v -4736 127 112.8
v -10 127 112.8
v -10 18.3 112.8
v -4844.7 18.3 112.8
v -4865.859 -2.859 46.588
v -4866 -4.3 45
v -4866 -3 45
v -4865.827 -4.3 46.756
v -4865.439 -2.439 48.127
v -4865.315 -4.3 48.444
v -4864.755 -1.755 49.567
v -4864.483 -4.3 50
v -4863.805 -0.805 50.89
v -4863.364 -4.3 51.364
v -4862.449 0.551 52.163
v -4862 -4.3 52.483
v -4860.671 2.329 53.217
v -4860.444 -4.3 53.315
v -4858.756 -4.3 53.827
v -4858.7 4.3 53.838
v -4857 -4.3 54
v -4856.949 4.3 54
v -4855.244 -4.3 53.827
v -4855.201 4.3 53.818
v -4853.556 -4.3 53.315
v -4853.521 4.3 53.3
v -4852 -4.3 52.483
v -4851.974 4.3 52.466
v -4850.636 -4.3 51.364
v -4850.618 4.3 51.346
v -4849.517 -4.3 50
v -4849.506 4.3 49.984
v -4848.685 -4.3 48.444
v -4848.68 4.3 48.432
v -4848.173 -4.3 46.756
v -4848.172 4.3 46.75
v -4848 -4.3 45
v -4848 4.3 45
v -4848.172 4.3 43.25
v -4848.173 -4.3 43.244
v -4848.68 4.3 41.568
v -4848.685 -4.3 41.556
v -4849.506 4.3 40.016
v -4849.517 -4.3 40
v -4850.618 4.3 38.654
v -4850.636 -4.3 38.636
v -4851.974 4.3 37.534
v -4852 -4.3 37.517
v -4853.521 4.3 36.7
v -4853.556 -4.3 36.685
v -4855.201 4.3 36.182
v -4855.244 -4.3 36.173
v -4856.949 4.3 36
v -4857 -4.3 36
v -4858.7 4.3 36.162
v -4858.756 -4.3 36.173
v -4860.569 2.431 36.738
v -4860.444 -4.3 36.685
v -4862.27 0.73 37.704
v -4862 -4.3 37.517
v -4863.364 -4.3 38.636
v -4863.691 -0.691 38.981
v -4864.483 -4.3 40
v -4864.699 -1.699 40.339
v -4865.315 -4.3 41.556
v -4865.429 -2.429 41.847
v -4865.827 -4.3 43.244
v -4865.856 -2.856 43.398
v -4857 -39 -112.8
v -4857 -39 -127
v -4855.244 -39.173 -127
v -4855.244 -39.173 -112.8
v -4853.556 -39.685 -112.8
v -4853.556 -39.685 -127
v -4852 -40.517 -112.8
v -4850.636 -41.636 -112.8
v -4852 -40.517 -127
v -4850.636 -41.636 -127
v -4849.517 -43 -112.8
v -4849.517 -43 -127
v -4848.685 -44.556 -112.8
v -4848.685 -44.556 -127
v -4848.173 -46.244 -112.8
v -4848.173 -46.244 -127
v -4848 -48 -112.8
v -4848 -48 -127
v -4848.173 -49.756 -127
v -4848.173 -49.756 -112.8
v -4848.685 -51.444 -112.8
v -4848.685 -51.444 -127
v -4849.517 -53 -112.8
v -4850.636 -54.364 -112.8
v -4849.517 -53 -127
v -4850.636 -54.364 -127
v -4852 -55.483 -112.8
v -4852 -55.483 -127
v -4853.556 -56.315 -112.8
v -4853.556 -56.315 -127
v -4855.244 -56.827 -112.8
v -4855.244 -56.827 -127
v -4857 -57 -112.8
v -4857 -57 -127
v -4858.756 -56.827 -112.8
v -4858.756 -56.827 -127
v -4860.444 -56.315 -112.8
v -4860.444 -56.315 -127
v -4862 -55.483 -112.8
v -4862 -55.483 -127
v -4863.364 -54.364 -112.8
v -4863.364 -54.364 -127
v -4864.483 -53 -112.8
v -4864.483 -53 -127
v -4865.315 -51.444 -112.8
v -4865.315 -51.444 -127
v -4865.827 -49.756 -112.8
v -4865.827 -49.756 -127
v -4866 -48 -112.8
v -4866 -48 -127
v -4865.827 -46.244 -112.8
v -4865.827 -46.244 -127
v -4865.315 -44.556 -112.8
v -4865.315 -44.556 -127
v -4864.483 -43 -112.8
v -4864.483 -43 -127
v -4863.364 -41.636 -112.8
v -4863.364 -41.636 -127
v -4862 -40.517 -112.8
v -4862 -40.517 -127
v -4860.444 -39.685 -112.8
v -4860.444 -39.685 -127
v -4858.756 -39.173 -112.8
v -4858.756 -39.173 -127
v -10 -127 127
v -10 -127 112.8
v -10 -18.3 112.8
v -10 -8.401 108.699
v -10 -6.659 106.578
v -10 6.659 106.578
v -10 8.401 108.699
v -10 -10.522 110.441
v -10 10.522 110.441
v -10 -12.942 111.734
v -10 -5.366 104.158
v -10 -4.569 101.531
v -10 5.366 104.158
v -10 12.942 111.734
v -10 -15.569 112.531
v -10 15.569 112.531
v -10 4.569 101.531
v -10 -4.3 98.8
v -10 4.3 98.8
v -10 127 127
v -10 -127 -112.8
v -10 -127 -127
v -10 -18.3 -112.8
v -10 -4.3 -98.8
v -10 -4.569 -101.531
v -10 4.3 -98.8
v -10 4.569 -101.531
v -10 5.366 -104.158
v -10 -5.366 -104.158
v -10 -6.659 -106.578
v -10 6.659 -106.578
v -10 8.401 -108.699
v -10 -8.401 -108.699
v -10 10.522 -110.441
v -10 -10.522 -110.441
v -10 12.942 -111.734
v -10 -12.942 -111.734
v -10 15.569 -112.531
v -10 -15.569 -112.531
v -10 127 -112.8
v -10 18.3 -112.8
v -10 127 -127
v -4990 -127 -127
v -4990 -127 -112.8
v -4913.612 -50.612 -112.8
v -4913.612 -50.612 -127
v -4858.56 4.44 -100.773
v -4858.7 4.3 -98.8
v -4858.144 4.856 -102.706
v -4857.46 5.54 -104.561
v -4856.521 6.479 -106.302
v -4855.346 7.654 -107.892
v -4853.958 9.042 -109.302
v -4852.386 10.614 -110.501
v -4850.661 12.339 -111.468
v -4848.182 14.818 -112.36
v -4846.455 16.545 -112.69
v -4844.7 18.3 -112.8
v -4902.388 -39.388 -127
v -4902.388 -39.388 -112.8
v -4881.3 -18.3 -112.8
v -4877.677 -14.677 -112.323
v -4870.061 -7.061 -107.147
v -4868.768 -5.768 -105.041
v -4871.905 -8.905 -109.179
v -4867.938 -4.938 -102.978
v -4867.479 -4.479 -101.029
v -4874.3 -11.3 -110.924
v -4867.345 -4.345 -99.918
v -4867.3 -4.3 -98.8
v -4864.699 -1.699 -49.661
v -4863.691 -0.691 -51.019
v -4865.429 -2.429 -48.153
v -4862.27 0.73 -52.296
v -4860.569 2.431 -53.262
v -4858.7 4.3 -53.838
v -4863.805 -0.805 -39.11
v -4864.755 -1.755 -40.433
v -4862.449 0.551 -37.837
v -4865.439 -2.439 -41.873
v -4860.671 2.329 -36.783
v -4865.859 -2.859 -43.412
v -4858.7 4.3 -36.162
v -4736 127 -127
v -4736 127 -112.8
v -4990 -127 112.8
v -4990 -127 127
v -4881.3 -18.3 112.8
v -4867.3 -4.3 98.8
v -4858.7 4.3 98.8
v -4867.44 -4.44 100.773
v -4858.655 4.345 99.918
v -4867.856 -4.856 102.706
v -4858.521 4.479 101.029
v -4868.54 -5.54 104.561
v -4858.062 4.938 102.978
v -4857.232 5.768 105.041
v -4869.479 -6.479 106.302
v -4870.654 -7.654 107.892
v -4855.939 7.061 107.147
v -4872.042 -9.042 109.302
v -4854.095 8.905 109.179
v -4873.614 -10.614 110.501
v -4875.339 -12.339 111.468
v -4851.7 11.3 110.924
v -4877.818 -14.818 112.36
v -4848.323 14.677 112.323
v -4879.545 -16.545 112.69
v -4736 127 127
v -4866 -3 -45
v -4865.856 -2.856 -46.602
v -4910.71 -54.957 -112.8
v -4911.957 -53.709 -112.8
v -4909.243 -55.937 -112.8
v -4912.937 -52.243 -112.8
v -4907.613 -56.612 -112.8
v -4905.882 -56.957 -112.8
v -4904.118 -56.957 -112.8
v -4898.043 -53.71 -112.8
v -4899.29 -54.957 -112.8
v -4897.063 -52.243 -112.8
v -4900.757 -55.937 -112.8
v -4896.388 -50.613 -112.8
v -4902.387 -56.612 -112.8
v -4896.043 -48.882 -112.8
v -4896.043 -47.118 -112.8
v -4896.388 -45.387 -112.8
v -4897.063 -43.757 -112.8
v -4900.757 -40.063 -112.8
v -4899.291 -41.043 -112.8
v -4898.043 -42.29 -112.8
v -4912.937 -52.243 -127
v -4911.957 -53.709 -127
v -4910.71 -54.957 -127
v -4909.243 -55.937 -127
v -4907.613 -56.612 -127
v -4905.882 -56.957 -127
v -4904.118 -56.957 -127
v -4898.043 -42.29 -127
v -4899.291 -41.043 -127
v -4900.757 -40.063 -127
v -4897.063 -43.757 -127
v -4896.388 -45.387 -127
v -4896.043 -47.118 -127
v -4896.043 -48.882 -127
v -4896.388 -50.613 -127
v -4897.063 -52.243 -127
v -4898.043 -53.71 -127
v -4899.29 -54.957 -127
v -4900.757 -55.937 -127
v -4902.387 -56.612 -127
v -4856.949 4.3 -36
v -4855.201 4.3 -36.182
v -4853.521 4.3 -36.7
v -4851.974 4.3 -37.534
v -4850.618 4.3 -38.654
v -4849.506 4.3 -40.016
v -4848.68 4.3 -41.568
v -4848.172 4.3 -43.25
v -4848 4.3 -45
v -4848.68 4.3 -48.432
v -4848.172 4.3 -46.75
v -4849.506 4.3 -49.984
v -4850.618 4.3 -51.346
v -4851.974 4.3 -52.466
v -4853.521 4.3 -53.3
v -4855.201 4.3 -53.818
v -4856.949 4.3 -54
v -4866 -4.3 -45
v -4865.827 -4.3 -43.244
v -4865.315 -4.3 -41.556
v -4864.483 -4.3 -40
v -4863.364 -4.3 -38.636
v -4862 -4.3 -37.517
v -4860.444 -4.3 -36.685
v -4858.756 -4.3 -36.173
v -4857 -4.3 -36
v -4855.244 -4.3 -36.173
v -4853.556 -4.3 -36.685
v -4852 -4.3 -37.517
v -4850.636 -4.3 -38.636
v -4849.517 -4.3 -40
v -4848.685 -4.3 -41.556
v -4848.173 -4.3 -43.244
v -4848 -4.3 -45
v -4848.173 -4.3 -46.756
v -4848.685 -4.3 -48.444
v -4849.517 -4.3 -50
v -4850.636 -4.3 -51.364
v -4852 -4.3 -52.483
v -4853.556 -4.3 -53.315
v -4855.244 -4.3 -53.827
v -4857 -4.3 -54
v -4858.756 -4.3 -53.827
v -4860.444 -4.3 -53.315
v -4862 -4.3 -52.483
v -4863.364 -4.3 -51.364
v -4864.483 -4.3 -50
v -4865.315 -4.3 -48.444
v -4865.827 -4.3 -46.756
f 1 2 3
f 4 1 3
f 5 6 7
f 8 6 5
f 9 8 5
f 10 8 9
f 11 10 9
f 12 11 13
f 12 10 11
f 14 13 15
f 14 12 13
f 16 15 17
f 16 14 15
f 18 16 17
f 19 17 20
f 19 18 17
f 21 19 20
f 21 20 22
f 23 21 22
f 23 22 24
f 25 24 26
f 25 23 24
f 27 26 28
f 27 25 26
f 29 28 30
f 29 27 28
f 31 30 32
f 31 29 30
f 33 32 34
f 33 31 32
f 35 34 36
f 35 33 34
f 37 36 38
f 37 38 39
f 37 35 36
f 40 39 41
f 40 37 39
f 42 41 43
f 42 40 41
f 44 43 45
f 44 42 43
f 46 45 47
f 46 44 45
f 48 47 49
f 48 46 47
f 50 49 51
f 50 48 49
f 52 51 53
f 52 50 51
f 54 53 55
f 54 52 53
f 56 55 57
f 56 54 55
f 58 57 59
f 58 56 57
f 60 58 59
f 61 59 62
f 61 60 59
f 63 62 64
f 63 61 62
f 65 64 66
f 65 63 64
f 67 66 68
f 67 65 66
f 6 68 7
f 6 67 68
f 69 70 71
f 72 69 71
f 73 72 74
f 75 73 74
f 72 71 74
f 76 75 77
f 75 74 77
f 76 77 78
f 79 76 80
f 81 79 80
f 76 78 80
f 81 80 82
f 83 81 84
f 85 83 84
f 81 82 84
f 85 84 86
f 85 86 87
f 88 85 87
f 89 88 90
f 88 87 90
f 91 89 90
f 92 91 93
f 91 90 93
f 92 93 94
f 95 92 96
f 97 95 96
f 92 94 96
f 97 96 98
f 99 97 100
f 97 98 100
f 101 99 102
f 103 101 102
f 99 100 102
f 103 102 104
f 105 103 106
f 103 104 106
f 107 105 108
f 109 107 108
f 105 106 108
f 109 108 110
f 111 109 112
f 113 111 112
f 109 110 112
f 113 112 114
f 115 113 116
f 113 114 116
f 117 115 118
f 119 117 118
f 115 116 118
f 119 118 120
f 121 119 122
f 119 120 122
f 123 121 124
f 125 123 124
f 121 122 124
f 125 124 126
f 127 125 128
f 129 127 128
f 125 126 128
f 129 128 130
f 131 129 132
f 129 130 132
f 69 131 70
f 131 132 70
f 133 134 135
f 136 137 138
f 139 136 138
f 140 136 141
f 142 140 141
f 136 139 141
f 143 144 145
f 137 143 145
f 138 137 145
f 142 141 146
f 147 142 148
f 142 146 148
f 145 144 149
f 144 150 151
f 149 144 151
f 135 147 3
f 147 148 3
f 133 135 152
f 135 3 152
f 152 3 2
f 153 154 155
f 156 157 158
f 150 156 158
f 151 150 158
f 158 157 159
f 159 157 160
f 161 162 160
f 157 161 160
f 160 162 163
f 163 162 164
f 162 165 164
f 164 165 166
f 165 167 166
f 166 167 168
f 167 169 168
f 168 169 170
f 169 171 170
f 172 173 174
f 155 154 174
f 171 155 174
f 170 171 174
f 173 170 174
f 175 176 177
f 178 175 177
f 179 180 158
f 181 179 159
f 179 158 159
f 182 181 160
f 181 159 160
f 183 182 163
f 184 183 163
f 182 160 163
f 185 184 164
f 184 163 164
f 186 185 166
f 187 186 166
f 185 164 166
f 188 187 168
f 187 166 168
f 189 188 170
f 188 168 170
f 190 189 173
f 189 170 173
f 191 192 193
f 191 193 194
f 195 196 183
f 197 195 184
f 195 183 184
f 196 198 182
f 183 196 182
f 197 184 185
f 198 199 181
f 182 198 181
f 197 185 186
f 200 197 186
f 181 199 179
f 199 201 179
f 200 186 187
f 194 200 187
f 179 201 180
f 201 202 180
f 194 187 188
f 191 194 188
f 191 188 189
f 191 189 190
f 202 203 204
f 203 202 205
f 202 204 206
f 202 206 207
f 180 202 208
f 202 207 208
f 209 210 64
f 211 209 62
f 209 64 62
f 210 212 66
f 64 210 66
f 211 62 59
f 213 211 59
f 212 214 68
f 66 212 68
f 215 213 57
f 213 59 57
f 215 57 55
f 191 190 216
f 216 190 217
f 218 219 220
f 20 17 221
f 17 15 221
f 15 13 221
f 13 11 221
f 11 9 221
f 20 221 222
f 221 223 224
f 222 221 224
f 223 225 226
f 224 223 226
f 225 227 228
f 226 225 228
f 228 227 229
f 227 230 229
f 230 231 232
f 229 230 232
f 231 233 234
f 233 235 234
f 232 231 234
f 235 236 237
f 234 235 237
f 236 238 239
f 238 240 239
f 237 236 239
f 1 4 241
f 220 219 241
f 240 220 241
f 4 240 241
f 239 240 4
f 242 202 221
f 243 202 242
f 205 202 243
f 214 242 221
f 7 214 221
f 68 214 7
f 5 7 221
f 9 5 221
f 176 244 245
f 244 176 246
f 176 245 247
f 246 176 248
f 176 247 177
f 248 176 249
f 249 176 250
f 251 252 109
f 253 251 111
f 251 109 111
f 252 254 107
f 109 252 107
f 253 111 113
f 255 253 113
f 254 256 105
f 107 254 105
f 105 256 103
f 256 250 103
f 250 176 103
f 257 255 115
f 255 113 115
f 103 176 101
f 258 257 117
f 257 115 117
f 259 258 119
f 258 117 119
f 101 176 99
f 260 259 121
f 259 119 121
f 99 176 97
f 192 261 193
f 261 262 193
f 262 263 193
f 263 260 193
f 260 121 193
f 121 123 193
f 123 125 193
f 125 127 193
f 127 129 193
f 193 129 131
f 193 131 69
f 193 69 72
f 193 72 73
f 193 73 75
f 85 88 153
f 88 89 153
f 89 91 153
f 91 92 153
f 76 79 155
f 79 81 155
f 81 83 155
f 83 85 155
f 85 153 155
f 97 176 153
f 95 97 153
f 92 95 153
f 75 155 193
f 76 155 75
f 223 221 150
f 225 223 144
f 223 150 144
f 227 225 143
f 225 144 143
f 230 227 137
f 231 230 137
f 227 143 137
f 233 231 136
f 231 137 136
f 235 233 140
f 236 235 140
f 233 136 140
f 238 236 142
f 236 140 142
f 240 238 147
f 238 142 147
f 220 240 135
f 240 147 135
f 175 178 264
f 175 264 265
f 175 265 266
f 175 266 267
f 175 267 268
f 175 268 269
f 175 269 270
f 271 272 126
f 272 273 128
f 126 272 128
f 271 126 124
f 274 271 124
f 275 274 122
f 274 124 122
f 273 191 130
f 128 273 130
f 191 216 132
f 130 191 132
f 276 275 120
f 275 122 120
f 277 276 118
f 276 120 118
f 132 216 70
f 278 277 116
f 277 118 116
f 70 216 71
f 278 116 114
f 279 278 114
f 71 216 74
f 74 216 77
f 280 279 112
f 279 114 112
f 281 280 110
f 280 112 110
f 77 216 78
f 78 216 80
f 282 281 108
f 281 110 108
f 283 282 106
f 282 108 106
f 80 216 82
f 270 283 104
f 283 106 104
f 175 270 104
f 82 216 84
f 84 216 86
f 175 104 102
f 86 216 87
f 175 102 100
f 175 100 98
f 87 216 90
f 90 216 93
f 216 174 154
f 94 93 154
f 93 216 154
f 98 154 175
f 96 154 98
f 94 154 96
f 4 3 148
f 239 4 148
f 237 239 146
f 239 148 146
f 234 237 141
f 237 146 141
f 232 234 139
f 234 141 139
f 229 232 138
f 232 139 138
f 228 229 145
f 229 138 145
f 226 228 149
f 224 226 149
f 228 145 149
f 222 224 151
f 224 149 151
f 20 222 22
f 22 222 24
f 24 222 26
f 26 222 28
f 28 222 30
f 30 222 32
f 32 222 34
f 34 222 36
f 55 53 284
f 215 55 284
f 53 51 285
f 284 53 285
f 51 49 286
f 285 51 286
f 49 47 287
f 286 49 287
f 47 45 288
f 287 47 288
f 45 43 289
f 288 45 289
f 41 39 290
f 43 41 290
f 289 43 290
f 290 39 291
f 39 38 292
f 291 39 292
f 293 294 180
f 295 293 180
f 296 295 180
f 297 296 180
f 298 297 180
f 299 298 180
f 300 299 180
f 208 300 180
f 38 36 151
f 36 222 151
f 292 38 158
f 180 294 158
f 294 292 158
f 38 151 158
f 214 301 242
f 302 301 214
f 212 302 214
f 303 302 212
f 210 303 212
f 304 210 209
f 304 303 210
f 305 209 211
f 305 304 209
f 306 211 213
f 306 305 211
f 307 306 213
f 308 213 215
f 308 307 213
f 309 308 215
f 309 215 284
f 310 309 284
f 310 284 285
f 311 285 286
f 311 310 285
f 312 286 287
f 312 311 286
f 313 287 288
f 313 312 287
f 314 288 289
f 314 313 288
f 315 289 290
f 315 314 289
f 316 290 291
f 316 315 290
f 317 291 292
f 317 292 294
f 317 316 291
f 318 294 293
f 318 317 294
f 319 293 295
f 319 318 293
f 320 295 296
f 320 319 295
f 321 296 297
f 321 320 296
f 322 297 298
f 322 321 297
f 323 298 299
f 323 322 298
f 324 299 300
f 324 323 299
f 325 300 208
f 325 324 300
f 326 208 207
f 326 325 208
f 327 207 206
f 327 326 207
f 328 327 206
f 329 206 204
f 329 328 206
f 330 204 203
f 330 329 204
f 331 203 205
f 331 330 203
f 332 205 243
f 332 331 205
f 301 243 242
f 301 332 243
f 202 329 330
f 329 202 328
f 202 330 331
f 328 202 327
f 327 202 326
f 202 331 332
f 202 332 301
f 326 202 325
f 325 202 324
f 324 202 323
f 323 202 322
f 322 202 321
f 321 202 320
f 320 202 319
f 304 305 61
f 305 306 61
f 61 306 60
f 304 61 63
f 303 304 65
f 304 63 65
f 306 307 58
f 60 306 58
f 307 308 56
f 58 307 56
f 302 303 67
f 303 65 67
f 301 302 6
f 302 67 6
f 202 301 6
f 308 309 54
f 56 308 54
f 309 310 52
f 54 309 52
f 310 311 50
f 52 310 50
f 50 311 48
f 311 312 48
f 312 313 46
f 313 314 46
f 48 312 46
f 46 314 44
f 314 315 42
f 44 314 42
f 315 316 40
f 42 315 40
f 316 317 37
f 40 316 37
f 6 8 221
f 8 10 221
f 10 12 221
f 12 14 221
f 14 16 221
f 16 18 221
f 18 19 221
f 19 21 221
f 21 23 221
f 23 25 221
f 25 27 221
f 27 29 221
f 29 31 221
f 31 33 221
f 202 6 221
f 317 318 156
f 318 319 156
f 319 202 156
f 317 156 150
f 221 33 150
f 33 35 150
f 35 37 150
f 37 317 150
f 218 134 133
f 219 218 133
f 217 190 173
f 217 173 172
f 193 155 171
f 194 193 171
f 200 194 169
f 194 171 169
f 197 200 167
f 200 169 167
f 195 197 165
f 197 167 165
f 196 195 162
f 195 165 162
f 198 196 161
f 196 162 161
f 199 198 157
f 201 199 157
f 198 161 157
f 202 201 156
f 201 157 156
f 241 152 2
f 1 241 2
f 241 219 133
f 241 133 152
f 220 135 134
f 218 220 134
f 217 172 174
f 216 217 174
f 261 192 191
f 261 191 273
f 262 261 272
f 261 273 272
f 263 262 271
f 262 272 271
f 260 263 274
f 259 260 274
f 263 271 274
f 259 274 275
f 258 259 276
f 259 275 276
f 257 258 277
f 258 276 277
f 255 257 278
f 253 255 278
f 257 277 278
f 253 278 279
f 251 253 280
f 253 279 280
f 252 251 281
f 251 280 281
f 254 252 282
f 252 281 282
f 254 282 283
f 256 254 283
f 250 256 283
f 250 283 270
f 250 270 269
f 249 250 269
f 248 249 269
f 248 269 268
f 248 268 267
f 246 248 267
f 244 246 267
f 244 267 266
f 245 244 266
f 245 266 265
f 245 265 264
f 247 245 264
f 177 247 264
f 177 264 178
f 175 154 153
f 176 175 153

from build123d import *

# Parameters (mm, degrees)
UNIVERSAL_COLUMN_ICS_250UC72_9_1_DEPTH = 5000
SKETCH3_R                              = 9
CUT_EXTRUDE2_DEPTH                     = 14.2
SKETCH20_R                             = 9
CUT_EXTRUDE19_DEPTH                    = 4.3
SKETCH21_W                             = 254
SKETCH21_H                             = 254
CUT_EXTRUDE20_DEPTH                    = 10
SKETCH22_W                             = 282
SKETCH22_H                             = 282
CUT_EXTRUDE21_DEPTH                    = 10
CUT_EXTRUDE22_DEPTH                    = 4999.074129102


with BuildPart() as part:
    # Sketch1 → Universal Column_ics 250UC72.9(1) (new body)
    with BuildSketch(Plane(origin=(0, 0, 0), x_dir=(0, 1, 0), z_dir=(-1, 0, 0))):
        with BuildLine():
            Line((-127, -127), (127, -127))
            Line((127, -127), (127, -112.8))
            Line((127, -112.8), (18.3, -112.8))
            ThreePointArc((18.3, -112.8), (8.400505063, -108.699494937), (4.3, -98.8))
            Line((4.3, -98.8), (4.3, 98.8))
            ThreePointArc((4.3, 98.8), (8.400505063, 108.699494937), (18.3, 112.8))
            Line((18.3, 112.8), (127, 112.8))
            Line((127, 112.8), (127, 127))
            Line((127, 127), (-127, 127))
            Line((-127, 127), (-127, 112.8))
            Line((-127, 112.8), (-18.3, 112.8))
            ThreePointArc((-18.3, 112.8), (-8.400505063, 108.699494937), (-4.3, 98.8))
            Line((-4.3, 98.8), (-4.3, -98.8))
            ThreePointArc((-4.3, -98.8), (-8.400505063, -108.699494937), (-18.3, -112.8))
            Line((-18.3, -112.8), (-127, -112.8))
            Line((-127, -112.8), (-127, -127))
        make_face()
    extrude(amount=UNIVERSAL_COLUMN_ICS_250UC72_9_1_DEPTH)

    # Sketch3 → Cut-Extrude2 (cut)
    with BuildSketch(Plane(origin=(-4890.5, 0, -127), x_dir=(0, -1, 0), z_dir=(0, 0, -1))):
        with Locations(Location((48, -33.5, 0), (0, 0, 180))):
            Circle(SKETCH3_R)
        with Locations(Location((48, 14.5, 0), (0, 0, 180))):
            Circle(SKETCH3_R)
        with Locations(Location((-48, -33.5, 0), (0, 0, 180))):
            Circle(SKETCH3_R)
        with Locations(Location((-48, 14.5, 0), (0, 0, 180))):
            Circle(SKETCH3_R)
    extrude(amount=-CUT_EXTRUDE2_DEPTH, mode=Mode.SUBTRACT)

    # Sketch20 → Cut-Extrude19 (cut, symmetric)
    with BuildSketch(Plane(origin=(-4890.5, 0, 0), x_dir=(0, 0, -1), z_dir=(0, 1, 0))):
        with Locations(Location((45, -33.5, 0), (0, 0, 90))):
            Circle(SKETCH20_R)
        with Locations(Location((-45, -33.5, 0), (0, 0, 90))):
            Circle(SKETCH20_R)
        with Locations(Location((45, 14.5, 0), (0, 0, 90))):
            Circle(SKETCH20_R)
        with Locations(Location((-45, 14.5, 0), (0, 0, 90))):
            Circle(SKETCH20_R)
    extrude(amount=CUT_EXTRUDE19_DEPTH, both=True, mode=Mode.SUBTRACT)

    # Sketch21 → Cut-Extrude20 (cut)
    with BuildSketch(Plane(origin=(-5000, 0, 0), x_dir=(0, 1, 0), z_dir=(-1, 0, 0))):
        Rectangle(SKETCH21_W, SKETCH21_H)
    extrude(amount=-CUT_EXTRUDE20_DEPTH, mode=Mode.SUBTRACT)

    # Sketch22 → Cut-Extrude21 (cut)
    with BuildSketch(Plane(origin=(0, 0, 0), x_dir=(0, 1, 0), z_dir=(-1, 0, 0))):
        Rectangle(SKETCH22_W, SKETCH22_H)
    extrude(amount=CUT_EXTRUDE21_DEPTH, mode=Mode.SUBTRACT)

    # Sketch23 → Cut-Extrude22 (cut, through all)
    with BuildSketch(Plane.XY.offset(127)):
        Polygon((-4990, -127), (-4736, 127), (-4990, 127), align=None)
    extrude(amount=-CUT_EXTRUDE22_DEPTH, mode=Mode.SUBTRACT)


solid = part.part
